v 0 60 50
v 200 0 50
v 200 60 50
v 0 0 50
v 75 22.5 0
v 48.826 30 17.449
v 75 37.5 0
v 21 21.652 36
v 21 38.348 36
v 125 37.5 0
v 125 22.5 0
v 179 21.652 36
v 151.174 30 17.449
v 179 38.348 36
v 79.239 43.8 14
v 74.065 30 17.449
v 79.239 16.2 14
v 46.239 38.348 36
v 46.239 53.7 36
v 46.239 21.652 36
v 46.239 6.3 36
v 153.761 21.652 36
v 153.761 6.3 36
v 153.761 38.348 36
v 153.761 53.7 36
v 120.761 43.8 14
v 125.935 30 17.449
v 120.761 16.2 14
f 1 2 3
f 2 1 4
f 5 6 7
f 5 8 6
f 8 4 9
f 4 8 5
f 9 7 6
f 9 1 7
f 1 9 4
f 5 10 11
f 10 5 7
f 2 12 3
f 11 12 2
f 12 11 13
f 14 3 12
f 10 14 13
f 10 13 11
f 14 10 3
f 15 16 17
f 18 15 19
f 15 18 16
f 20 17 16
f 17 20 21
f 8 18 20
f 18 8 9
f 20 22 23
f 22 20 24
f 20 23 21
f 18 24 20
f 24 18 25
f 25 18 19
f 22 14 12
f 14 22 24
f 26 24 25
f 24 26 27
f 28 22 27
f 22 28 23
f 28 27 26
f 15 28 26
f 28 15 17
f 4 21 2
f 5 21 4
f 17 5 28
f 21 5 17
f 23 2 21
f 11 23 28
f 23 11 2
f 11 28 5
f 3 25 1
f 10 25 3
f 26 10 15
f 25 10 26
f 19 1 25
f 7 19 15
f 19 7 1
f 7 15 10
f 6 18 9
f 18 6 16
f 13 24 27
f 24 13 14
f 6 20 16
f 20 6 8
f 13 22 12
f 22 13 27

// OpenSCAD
handle_length = 200;
handle_width = 60;
handle_height = 50;

base_length = 50;
base_width = 15;
base_height = 0;

mirror([0,1,0]) rotate([90,0,0])
intersection() {
    linear_extrude(handle_width)
    difference() {
        polygon([
            [0, handle_height],
            [handle_length, handle_height],
            [(handle_length-base_length)/2 + base_length, 0],
            [(handle_length-base_length)/2, 0]
        ]);
        
        offset(-14) {
            polygon([
                [0, handle_height],
                [handle_length, handle_height],
                [(handle_length-base_length)/2 + base_length, 0],
                [(handle_length-base_length)/2, 0]
            ]);
        }
    }
    mirror([-1, 0, 1])
    linear_extrude(handle_length)
    difference() {
        polygon([
            [0, handle_height],
            [handle_width, handle_height],
            [(handle_width-base_width)/2 + base_width, 0],
            [(handle_width-base_width)/2, 0]
        ]);
        offset(-14) {
            polygon([
                [0, handle_height],
                [handle_width, handle_height],
                [(handle_width-base_width)/2 + base_width, 0],
                [(handle_width-base_width)/2, 0]
            ]);
        }
    }
}
